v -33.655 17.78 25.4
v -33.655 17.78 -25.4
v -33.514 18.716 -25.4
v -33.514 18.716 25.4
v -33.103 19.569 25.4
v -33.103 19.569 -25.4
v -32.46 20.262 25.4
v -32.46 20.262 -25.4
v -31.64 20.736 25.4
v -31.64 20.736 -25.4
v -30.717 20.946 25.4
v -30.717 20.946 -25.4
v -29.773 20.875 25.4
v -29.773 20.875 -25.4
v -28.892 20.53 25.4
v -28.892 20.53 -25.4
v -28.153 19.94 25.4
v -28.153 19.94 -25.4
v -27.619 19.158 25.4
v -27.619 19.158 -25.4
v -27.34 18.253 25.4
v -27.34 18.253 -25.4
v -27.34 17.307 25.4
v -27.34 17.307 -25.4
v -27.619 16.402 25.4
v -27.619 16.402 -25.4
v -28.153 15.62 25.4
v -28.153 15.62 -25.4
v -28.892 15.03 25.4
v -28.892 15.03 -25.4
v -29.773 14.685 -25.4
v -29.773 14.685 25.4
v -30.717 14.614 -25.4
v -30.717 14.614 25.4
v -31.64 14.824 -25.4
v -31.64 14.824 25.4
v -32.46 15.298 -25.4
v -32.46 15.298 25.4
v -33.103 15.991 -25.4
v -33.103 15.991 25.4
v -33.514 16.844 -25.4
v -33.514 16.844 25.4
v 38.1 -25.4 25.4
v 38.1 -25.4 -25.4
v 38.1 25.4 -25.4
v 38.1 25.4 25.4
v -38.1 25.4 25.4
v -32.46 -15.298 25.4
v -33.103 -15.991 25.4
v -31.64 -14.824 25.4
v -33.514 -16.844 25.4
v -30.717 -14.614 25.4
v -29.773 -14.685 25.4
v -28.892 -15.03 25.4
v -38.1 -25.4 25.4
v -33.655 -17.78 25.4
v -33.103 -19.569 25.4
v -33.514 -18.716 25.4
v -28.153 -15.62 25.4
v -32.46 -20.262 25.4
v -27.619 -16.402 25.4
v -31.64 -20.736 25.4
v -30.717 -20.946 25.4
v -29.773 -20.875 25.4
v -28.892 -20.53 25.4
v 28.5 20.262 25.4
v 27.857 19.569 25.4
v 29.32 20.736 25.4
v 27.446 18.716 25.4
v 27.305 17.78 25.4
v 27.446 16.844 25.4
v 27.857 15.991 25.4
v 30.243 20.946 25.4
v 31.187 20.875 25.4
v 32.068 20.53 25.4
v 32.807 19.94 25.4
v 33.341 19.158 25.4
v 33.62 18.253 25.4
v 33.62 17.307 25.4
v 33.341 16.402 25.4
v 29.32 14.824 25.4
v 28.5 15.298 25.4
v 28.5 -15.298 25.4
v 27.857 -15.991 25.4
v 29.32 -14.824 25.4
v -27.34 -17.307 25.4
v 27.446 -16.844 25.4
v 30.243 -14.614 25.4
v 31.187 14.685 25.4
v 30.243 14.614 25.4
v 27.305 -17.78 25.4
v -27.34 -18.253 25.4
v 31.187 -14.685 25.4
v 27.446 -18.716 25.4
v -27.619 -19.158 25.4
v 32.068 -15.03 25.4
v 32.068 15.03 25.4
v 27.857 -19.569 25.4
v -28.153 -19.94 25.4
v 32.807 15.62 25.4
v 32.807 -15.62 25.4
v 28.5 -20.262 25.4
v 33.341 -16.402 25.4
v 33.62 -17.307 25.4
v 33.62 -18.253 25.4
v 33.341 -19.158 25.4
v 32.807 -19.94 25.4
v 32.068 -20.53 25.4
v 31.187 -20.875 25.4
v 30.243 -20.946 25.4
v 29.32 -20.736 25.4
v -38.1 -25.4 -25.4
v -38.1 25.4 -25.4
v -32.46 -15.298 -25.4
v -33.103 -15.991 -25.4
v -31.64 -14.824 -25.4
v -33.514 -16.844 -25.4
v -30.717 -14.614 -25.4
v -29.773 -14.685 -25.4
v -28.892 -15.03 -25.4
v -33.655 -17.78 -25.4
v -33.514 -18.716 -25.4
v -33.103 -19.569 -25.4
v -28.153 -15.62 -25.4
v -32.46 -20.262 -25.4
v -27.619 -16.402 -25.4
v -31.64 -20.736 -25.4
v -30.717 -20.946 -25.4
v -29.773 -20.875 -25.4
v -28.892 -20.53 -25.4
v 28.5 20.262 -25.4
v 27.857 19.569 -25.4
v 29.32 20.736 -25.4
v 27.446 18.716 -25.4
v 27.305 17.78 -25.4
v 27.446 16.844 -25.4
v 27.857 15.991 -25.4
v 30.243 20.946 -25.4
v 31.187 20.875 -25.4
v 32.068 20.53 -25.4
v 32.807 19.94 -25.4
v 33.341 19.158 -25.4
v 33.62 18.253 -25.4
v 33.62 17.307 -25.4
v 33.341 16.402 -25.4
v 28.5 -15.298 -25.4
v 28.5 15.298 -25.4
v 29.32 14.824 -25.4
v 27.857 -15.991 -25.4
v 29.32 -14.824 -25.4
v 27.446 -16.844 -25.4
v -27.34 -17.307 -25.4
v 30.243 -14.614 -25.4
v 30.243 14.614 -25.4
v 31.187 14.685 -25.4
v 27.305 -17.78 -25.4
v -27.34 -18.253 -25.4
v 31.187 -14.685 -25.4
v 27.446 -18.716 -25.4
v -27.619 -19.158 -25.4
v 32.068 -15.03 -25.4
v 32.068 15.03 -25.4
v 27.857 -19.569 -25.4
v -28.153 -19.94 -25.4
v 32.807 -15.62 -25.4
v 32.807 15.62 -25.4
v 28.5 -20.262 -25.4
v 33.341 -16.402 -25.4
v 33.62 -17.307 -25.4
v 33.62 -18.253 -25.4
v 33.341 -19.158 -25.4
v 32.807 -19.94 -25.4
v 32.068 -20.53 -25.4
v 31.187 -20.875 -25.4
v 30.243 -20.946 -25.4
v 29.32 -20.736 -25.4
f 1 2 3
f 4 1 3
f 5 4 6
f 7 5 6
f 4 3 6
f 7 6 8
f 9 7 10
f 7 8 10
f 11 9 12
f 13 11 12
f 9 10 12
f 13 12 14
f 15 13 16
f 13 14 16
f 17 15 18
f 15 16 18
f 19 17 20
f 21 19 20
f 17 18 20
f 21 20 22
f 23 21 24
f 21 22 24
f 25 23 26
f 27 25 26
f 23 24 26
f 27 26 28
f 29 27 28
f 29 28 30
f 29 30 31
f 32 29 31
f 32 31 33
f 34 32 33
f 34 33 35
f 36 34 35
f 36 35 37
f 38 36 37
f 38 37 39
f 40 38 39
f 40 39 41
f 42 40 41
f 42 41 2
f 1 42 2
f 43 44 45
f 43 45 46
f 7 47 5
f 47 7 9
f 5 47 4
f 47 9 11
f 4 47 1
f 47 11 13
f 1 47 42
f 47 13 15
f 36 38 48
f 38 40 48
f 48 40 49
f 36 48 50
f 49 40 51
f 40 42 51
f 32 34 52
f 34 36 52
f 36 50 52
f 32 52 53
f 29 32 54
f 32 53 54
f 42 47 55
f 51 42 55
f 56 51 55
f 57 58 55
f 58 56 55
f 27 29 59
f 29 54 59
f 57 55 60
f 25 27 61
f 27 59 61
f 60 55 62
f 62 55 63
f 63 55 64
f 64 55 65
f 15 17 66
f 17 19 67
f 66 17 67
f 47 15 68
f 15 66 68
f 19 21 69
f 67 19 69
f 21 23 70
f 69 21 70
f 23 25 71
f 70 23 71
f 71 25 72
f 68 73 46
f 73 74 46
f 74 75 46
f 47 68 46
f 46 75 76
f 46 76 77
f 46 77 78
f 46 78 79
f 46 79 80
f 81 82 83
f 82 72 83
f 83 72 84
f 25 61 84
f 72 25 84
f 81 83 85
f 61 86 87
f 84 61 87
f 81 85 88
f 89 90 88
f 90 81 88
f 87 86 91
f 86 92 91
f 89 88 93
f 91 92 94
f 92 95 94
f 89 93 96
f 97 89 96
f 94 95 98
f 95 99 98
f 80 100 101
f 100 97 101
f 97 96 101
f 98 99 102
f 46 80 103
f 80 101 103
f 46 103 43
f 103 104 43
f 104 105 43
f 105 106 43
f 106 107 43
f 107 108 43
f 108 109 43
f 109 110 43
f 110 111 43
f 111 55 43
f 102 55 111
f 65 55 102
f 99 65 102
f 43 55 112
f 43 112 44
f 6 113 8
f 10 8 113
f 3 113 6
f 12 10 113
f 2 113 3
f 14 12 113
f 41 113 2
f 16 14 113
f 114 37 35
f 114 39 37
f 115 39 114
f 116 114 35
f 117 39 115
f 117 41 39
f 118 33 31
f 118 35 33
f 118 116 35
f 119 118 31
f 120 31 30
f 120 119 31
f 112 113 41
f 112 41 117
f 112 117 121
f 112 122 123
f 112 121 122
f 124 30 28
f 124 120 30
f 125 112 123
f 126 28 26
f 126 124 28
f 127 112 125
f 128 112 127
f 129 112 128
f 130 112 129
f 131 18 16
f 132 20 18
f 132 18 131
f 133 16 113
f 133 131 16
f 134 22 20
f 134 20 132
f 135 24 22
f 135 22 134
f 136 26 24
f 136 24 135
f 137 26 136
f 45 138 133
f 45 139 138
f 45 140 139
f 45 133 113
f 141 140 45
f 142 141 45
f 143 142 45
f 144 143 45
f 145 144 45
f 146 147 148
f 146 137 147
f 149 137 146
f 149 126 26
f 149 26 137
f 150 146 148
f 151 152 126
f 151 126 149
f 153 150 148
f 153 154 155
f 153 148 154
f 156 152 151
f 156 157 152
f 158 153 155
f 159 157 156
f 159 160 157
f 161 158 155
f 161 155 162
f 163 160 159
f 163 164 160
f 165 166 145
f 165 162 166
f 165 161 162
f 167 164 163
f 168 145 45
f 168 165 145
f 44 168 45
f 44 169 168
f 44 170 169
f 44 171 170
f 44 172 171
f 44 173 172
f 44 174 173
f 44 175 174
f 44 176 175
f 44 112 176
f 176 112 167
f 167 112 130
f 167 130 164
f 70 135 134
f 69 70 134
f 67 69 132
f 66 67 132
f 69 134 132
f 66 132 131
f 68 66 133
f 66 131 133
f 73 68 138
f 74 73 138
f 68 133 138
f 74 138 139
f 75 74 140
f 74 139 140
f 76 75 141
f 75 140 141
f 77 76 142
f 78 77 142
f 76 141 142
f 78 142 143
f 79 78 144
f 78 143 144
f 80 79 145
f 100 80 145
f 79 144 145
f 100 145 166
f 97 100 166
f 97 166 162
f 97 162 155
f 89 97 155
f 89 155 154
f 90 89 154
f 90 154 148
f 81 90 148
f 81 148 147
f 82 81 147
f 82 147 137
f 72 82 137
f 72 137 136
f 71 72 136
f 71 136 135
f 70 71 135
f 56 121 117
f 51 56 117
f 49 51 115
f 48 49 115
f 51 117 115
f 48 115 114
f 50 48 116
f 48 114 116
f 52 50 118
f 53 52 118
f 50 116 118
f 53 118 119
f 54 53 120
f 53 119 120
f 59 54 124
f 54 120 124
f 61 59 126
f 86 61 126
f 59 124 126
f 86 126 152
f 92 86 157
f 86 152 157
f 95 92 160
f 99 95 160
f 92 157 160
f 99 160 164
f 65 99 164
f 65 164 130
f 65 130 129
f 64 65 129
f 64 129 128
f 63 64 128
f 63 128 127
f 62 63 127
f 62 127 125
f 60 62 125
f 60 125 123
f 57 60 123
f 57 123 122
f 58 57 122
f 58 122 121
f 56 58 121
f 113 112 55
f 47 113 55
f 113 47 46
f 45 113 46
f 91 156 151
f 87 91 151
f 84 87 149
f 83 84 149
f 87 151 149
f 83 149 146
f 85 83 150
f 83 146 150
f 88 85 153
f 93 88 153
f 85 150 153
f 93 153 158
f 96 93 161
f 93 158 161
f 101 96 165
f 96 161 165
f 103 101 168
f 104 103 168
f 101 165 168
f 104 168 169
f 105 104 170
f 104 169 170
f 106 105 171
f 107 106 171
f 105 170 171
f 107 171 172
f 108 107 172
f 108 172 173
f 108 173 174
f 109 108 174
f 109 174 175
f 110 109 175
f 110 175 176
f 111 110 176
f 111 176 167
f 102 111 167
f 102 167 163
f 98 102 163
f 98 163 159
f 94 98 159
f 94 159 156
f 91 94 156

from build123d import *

# Parameters (mm, degrees)
F0_W     = 76.2
F0_H     = 50.8
F1_DEPTH = 25.4
F3_D     = 6.35


with BuildPart() as f1:
    # F0 (on Front) → F1 (new body, symmetric)
    with BuildSketch(Plane.XZ):
        Rectangle(F0_W, F0_H)
    extrude(amount=F1_DEPTH, both=True)

    # F3 (through all)
    with Locations(Plane.XY.offset(25.4)):
        with Locations((30.48, -17.78), (-30.48, -17.78), (30.48, 17.78), (-30.48, 17.78)):
            Hole(F3_D / 2)


solid = f1.part
